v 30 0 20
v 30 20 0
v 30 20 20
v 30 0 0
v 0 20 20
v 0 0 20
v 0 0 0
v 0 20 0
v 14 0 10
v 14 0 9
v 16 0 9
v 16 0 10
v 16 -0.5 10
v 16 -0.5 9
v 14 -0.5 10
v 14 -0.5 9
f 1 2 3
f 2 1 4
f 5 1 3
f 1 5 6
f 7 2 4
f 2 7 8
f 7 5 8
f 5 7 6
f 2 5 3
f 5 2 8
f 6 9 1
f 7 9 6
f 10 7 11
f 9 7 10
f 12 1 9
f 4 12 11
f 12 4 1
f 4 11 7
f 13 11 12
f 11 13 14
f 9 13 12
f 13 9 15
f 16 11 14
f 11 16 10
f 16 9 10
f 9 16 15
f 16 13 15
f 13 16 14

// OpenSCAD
cube([30, 20, 20]);
translate([14, -0.5, 9]) {
	cube([2, 1, 1]);
}
